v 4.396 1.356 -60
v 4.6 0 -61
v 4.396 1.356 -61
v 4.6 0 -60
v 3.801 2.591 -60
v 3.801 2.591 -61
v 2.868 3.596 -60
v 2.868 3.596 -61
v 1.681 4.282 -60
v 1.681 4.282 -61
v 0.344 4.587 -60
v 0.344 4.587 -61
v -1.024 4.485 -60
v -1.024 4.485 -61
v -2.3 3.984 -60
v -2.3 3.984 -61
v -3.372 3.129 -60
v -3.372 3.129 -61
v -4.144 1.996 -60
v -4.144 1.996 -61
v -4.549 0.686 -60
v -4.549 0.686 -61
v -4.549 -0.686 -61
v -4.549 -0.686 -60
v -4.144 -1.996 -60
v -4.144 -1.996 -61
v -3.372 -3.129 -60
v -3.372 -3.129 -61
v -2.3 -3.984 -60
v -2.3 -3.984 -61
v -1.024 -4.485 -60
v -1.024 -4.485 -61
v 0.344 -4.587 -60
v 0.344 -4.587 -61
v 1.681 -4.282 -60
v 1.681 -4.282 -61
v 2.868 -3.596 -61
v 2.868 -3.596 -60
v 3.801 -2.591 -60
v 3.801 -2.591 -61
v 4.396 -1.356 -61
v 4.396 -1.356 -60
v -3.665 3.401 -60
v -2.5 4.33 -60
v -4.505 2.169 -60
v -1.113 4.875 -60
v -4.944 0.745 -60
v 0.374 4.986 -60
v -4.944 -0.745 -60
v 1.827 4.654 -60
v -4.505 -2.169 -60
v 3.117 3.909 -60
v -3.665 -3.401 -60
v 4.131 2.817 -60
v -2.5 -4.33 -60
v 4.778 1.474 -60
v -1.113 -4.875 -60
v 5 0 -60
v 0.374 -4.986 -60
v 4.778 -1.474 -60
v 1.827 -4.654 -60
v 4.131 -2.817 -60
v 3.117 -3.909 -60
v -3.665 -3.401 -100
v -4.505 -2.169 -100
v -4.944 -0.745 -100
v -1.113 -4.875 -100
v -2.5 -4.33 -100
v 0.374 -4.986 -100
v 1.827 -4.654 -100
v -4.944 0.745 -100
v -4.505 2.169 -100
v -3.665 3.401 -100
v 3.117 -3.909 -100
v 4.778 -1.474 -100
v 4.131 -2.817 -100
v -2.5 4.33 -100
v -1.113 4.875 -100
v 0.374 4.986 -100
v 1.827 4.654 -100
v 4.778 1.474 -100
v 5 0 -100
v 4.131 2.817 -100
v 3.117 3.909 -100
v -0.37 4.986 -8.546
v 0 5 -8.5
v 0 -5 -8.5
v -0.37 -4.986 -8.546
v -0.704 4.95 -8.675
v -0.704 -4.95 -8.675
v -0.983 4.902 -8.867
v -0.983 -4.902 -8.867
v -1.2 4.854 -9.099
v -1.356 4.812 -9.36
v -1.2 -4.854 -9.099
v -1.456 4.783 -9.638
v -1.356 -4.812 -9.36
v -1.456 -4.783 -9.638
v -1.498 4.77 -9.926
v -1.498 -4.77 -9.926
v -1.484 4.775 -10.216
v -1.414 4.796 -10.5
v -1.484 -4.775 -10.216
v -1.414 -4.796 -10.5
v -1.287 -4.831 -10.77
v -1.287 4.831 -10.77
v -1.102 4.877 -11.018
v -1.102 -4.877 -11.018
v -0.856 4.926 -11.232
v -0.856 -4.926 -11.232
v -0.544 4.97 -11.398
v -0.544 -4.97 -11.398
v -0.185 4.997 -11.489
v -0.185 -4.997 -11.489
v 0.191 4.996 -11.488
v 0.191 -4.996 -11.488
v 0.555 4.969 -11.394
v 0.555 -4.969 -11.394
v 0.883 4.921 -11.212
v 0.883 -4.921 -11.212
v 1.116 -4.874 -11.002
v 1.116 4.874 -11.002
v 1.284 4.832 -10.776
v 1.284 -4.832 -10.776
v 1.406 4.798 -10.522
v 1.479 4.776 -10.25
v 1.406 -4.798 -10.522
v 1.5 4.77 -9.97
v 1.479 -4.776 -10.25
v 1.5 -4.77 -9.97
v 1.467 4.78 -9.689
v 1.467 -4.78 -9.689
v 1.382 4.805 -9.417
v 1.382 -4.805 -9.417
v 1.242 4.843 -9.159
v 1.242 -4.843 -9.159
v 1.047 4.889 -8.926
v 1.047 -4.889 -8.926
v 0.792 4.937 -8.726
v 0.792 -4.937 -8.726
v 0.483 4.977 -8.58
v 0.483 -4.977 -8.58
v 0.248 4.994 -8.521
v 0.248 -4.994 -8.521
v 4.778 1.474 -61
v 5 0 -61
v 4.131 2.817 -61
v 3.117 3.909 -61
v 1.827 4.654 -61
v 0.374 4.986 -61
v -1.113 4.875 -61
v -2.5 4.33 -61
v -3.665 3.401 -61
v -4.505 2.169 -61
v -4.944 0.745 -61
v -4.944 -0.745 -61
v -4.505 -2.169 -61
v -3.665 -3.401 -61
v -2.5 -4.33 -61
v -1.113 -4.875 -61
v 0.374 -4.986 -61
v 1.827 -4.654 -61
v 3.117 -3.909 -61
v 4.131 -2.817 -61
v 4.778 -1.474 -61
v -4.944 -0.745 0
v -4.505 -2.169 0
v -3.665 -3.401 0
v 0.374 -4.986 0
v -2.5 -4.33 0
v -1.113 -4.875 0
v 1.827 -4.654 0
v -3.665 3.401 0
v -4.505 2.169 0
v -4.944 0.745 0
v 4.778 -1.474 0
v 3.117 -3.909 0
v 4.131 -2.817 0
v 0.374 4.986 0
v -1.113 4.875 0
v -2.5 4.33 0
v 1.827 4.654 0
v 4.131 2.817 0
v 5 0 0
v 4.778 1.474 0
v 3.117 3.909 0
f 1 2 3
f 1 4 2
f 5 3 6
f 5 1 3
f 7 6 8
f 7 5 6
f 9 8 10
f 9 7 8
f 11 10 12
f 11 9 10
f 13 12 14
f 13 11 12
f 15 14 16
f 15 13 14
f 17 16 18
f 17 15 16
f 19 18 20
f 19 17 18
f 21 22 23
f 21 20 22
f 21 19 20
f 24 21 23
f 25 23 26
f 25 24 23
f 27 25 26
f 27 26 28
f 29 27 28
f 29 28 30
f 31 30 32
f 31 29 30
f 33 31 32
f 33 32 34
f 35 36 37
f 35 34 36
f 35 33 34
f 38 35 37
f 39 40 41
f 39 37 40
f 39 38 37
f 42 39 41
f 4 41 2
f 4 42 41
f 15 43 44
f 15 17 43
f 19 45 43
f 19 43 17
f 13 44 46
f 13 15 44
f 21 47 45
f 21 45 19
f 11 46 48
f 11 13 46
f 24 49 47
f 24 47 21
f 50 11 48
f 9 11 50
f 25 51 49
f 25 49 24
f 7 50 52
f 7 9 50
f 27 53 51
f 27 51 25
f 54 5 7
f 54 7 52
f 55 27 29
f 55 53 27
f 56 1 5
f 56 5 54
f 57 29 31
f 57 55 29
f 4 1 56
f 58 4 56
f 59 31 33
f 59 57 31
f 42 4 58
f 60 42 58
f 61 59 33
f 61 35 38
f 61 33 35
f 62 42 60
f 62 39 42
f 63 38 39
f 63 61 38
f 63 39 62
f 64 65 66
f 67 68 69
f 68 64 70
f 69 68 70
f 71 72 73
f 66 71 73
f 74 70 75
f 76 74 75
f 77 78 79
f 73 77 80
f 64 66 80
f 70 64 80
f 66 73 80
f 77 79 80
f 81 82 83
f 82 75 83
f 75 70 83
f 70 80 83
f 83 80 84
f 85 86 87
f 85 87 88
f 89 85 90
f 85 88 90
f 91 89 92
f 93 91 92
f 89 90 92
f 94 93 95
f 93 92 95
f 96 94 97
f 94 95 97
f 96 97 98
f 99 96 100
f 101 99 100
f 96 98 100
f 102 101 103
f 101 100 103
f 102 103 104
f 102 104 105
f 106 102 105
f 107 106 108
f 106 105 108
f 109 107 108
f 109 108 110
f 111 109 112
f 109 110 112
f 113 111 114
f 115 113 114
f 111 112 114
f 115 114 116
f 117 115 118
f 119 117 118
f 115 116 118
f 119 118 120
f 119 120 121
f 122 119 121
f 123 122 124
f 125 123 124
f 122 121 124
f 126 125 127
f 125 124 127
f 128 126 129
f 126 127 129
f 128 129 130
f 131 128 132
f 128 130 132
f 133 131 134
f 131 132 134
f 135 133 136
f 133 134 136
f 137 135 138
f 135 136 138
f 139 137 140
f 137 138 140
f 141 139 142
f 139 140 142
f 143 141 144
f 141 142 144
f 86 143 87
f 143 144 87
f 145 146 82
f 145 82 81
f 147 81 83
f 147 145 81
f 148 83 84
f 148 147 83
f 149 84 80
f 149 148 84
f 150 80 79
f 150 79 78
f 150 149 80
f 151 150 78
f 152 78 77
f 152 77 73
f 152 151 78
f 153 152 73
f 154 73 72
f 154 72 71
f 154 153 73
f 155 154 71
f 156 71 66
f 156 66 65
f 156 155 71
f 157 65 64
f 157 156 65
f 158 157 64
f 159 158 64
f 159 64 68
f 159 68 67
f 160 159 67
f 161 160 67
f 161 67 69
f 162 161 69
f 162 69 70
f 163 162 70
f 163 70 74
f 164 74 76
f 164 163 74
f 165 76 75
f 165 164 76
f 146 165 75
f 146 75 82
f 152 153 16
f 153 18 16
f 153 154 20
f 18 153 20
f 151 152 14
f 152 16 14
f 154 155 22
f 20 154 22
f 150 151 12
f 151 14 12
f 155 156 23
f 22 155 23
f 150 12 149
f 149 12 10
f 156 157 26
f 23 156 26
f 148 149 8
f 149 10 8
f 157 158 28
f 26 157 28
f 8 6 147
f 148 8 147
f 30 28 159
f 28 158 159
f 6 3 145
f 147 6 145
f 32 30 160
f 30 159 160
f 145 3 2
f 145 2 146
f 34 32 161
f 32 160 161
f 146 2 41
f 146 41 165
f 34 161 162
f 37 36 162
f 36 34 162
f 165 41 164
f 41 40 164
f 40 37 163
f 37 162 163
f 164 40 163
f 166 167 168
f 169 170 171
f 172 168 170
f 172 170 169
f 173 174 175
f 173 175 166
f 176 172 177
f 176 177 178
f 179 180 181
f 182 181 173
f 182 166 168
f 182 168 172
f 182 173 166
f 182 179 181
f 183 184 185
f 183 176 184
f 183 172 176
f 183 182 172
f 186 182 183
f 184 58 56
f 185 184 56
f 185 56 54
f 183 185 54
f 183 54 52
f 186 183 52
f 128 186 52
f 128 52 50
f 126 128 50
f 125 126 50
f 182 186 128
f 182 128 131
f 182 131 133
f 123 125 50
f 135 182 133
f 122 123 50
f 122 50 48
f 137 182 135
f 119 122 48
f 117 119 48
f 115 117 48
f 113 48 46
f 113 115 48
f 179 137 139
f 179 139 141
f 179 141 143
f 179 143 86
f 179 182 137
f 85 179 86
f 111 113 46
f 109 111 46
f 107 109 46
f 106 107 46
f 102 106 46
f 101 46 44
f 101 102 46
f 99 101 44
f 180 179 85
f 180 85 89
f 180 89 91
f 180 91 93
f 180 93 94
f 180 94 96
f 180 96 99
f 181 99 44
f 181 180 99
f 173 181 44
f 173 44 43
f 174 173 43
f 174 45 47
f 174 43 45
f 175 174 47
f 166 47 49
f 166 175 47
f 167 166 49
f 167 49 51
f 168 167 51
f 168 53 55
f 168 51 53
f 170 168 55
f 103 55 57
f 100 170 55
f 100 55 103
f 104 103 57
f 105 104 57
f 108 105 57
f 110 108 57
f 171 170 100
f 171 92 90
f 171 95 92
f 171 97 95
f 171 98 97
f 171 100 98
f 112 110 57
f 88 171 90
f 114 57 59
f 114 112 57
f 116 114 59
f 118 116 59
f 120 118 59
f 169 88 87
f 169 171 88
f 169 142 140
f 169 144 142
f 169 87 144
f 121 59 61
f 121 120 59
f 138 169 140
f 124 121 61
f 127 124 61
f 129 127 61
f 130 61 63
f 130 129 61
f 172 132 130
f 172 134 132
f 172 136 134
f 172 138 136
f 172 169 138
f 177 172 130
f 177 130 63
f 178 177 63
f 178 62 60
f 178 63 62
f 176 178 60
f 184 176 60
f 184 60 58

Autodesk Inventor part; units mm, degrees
ref_plane "YZ Plane" through (0, 0, 0) normal (1, 0, 0) x (0, 1, 0)
ref_plane "XZ Plane" through (0, 0, 0) normal (0, 1, 0) x (-1, 0, 0)
ref_plane "XY Plane" through (0, 0, 0) normal (0, 0, 1) x (1, 0, 0)
sketch "Sketch3" plane through (0, 0, 0) normal (0, 0, 1) x (1, 0, 0)
  circle A0 centre (0, 0) radius 5
  dimension "d0" = 10
extrude "Extrusion1" add sketch "Sketch3" against normal blind 100
sketch "Sketch4" plane through (0, 0, 0) normal (0, 1, 0) x (-1, 0, 0)
  circle A0 centre (0, -10) radius 1.5
  line L0 (5, 0) -> (-5, 0) projected
  point P0 (0, 0)
  dimension "d3" = 3
  dimension "d11" = 10
hole "Hole1" at (0, 0, -10) direction (0, -1, 0) diameter 3 end through all both
sketch "Sketch14" plane through (0, 0, 0) normal (0, 1, 0) x (-1, 0, 0)
  line L0 (-5, 0) -> (-5, -100) projected
  line L1 (-5, -61) -> (-4.6, -61)
  line L2 (-4.6, -61) -> (-4.6, -60)
  line L3 (-4.6, -60) -> (-5, -60)
  line L4 (-5, -60) -> (-5, -61)
  line L5 (5, 0) -> (-5, 0) projected
  line L6 (0, -120) -> (0, 20) projected
  point P0 (0, 0)
  dimension "d22" = 60
  dimension "d23" = 0.4
  dimension "d24" = 1
revolve "Revolution2" cut sketch "Sketch14" angle 360 about axis through (0, 0, 0) along (0, 0, -1)
equation "\"BendRadius\" = Thickness"
equation "\"BendReliefWidth\" = Thickness"
equation "\"BendReliefDepth\" = 0.5 * Thickness"
equation "\"CornerReliefSize\" = 4 * Thickness"
equation "\"MinimumRemnant\" = 2 * Thickness"
equation "\"TransitionRadius\" = BendRadius"
equation "\"JacobiRadiusSize\" = BendRadius"
equation "\"GapSize\" = Thickness"
equation "\"Thickness\" = 3.048"
properties part number "Shaft_piston"
